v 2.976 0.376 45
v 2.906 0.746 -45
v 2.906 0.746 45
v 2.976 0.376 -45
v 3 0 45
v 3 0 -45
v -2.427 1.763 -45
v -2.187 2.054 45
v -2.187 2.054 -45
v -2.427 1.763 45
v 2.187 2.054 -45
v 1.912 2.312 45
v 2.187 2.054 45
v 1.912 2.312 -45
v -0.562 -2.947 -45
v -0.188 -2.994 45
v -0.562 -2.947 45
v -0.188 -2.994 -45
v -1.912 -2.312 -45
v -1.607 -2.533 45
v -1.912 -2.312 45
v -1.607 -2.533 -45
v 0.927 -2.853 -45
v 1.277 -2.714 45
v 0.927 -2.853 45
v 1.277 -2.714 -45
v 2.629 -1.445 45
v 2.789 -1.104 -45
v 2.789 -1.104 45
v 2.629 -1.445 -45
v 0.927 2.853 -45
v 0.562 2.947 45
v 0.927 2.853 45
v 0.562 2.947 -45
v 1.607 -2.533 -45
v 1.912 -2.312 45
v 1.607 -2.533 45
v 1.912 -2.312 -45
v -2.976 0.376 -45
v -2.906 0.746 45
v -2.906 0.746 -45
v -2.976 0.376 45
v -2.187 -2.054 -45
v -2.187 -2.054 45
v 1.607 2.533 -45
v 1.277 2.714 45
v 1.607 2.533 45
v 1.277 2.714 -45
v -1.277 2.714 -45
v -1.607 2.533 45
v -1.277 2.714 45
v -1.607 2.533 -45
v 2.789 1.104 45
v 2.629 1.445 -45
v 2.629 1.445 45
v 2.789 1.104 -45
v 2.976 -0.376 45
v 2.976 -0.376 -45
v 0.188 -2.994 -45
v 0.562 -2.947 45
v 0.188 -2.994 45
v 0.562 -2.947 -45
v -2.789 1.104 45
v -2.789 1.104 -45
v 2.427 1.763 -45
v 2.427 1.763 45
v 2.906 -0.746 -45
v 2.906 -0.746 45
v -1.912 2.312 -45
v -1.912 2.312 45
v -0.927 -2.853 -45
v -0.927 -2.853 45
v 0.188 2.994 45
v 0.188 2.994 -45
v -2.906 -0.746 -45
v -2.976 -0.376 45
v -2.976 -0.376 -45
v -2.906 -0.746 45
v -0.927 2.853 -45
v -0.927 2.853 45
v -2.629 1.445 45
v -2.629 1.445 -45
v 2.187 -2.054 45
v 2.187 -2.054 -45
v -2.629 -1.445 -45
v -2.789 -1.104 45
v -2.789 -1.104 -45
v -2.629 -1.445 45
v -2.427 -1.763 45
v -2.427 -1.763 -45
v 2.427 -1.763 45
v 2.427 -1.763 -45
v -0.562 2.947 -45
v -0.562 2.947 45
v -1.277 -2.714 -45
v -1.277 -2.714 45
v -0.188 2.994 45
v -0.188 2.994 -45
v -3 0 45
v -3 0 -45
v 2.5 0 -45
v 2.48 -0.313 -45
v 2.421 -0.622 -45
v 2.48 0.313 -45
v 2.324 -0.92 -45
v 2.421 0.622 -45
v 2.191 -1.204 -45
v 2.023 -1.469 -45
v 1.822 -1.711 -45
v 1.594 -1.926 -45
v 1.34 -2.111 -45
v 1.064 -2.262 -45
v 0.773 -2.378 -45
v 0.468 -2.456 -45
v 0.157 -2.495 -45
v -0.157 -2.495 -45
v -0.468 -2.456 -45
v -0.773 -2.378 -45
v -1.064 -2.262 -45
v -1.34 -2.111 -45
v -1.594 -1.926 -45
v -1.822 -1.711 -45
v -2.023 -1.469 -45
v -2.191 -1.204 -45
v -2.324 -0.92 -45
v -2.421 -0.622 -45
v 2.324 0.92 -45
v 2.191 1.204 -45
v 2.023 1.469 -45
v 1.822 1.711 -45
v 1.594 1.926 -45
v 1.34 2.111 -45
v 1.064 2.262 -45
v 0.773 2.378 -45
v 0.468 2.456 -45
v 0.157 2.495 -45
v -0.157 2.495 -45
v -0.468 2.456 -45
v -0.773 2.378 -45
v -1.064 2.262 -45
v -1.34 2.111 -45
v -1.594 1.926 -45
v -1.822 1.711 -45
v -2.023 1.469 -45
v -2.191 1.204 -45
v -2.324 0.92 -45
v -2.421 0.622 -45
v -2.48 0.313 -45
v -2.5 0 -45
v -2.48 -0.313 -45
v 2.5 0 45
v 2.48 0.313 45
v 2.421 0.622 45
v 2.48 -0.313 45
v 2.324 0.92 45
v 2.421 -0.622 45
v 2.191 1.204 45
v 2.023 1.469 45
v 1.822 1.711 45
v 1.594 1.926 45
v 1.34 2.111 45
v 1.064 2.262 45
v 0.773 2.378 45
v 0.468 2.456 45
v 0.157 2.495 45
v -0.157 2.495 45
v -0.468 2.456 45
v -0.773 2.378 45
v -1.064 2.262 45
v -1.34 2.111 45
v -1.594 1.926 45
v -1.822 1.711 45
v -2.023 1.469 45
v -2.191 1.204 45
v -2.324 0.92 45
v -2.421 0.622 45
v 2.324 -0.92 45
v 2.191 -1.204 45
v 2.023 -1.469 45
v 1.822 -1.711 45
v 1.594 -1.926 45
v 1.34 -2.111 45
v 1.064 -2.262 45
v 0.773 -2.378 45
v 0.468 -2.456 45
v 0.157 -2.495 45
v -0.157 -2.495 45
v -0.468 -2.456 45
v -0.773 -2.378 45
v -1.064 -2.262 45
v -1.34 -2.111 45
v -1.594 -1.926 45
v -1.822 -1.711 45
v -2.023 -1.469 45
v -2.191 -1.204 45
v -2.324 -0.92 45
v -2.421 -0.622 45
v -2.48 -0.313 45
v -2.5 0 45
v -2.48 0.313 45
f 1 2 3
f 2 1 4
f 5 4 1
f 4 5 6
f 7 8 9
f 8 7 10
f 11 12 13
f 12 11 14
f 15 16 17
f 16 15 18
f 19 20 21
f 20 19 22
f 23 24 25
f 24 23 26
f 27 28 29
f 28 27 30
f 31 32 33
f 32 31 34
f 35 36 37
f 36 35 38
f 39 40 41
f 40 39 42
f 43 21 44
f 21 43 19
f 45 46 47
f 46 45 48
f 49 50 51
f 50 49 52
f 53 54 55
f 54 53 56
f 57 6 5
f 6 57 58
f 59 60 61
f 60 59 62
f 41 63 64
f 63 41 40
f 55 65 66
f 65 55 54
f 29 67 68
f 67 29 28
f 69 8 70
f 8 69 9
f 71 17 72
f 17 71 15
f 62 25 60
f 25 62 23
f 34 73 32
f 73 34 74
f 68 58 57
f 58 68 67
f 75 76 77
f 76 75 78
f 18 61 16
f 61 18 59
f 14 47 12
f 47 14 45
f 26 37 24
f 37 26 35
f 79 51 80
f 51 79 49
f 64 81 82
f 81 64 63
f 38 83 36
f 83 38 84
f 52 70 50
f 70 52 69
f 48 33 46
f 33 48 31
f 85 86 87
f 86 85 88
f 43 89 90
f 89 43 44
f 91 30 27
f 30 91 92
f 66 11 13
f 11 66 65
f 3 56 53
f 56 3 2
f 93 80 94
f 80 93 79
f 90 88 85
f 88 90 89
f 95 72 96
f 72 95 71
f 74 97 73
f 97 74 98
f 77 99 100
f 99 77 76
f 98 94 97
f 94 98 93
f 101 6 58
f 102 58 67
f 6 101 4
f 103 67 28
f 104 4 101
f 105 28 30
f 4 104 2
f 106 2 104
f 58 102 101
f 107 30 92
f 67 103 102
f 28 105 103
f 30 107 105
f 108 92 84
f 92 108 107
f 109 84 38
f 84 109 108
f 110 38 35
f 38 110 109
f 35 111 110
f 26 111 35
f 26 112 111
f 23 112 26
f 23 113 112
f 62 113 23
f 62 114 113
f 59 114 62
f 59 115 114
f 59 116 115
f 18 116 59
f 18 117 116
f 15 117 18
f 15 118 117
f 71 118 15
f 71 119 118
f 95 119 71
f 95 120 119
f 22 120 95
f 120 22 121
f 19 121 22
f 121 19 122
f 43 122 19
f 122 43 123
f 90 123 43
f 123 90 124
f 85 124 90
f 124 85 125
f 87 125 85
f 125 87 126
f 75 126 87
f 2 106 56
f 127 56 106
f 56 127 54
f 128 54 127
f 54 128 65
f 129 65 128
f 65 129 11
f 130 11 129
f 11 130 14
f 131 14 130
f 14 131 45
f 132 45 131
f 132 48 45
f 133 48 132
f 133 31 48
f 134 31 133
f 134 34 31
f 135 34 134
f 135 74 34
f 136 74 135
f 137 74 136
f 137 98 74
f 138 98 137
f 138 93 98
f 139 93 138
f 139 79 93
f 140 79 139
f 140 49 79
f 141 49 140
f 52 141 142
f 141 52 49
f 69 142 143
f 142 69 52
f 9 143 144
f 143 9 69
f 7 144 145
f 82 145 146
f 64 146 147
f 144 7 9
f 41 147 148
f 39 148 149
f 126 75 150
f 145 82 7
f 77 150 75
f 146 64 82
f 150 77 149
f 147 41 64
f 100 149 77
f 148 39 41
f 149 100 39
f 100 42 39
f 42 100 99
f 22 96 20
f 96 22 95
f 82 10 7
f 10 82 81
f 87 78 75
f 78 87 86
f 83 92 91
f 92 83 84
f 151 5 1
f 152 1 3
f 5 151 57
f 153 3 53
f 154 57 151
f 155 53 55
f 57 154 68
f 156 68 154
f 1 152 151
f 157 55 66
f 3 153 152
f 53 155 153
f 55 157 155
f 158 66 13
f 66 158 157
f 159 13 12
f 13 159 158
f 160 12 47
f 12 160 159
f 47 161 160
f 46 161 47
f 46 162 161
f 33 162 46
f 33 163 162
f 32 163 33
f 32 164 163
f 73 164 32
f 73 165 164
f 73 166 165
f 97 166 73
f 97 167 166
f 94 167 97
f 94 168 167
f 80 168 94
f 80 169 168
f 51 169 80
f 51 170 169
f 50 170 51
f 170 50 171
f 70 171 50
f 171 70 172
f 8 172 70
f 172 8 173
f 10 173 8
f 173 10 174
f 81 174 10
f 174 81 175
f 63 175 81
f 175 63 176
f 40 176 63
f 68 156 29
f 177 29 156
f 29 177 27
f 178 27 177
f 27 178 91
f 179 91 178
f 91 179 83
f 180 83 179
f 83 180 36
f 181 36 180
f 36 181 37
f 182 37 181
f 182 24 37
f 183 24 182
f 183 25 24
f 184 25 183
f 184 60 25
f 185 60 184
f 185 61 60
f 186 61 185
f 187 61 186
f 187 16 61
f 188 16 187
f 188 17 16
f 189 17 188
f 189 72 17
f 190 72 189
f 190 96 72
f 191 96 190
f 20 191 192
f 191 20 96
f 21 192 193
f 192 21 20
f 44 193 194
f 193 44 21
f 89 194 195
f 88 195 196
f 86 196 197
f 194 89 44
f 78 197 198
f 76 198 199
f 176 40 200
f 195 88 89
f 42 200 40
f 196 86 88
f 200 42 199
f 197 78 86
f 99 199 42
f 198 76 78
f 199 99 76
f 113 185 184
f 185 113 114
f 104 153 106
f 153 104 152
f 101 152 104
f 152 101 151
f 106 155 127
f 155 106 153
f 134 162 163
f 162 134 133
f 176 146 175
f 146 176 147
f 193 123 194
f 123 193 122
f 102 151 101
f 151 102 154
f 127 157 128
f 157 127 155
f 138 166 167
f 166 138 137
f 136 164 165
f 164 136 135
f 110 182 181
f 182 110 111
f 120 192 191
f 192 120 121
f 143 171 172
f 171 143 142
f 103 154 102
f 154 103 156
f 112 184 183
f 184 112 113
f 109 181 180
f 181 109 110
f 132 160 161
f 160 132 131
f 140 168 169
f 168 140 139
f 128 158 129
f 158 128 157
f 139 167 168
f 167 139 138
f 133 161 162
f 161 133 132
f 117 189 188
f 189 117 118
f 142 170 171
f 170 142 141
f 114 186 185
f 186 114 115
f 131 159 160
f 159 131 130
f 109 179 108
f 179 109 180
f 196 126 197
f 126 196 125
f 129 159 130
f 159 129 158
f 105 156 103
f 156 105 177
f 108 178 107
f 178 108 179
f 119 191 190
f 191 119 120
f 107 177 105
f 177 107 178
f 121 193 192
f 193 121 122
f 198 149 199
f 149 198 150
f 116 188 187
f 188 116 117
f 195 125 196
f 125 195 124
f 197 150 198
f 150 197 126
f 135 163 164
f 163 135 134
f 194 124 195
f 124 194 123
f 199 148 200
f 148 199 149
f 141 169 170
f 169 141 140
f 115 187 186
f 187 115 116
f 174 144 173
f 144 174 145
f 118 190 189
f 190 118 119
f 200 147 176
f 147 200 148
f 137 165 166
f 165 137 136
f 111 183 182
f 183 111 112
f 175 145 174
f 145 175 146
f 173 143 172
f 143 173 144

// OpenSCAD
$fn = 50;


difference() {
	union() {
		translate(v = [0, 0, -45.0000000000]) {
			cylinder(h = 90, r = 3.0000000000);
		}
	}
	union() {
		translate(v = [0, 0, -100.0000000000]) {
			cylinder(h = 200, r = 2.5000000000);
		}
	}
}
